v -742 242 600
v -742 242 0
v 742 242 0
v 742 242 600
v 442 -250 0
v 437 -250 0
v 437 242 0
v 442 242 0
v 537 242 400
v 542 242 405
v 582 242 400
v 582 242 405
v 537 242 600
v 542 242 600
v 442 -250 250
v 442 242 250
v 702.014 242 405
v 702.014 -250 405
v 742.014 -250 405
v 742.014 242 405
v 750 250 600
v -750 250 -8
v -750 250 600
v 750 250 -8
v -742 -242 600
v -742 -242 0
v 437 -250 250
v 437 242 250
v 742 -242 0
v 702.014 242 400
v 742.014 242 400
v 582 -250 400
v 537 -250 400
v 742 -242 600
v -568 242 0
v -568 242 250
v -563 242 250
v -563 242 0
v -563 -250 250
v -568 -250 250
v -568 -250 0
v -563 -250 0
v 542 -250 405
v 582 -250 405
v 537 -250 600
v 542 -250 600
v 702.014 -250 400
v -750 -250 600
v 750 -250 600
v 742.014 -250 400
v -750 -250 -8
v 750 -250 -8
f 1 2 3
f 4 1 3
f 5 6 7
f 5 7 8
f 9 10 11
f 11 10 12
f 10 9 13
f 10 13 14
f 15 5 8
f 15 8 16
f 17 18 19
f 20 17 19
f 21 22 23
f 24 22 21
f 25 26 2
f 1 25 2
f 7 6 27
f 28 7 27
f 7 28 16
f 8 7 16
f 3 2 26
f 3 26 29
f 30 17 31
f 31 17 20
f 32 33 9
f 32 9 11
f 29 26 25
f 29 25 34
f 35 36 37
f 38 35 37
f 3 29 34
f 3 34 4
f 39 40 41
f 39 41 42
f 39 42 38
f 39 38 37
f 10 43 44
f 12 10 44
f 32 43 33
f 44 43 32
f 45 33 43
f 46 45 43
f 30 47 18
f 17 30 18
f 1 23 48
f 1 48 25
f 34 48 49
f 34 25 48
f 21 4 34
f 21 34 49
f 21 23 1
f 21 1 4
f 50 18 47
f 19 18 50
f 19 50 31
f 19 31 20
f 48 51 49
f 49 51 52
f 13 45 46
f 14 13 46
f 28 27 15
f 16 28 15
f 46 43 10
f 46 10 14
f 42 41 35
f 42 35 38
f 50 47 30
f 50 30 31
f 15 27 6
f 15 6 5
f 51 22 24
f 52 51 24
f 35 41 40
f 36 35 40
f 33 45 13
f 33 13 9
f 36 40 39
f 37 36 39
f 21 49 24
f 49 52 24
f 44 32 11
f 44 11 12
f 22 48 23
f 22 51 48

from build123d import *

# Parameters (mm, degrees)
F0_W     = 1500
F0_H     = 500
F0_W_2   = 1484
F0_H_2   = 484
F1_DEPTH = 8
F2_DEPTH = 600
F4_W     = 5
F4_H     = 195
F4_W_2   = 40
F4_H_2   = 5
F4_H_3   = 250
F5_DEPTH = 492


with BuildPart() as f1:
    # F0 (on Top) → F1 (new body)
    with BuildSketch(Plane.XY):
        Rectangle(F0_W, F0_H)
        Rectangle(F0_W_2, F0_H_2, mode=Mode.SUBTRACT)
        Rectangle(F0_W_2, F0_H_2)
    extrude(amount=-F1_DEPTH)


with BuildPart() as f2:
    # F0 (on Top) → F2 (new body)
    with BuildSketch(Plane.XY):
        Rectangle(F0_W, F0_H)
        Rectangle(F0_W_2, F0_H_2, mode=Mode.SUBTRACT)
    extrude(amount=F2_DEPTH)


with BuildPart() as f1_1:
    add(f1.part)

    # F3: union F2
    add(f2.part)


with BuildPart() as f5:
    # F4 (on face) → F5 (new body, through all)
    with BuildSketch(Plane.XZ.offset(250)):
        with Locations((539.5, 502.5)):
            Rectangle(F4_W, F4_H)
        with Locations((562, 402.5)):
            Rectangle(F4_W_2, F4_H_2)
        with Locations((539.5, 402.5)):
            Rectangle(F4_W, F4_H_2)
        with Locations((722.014349, 402.5)):
            Rectangle(F4_W_2, F4_H_2)
        with Locations((439.5, 125)):
            Rectangle(F4_W, F4_H_3)
        with Locations((-565.5, 125)):
            Rectangle(F4_W, F4_H_3)
    extrude(amount=-F5_DEPTH)


solid = Compound([f1_1.part, f5.part])
